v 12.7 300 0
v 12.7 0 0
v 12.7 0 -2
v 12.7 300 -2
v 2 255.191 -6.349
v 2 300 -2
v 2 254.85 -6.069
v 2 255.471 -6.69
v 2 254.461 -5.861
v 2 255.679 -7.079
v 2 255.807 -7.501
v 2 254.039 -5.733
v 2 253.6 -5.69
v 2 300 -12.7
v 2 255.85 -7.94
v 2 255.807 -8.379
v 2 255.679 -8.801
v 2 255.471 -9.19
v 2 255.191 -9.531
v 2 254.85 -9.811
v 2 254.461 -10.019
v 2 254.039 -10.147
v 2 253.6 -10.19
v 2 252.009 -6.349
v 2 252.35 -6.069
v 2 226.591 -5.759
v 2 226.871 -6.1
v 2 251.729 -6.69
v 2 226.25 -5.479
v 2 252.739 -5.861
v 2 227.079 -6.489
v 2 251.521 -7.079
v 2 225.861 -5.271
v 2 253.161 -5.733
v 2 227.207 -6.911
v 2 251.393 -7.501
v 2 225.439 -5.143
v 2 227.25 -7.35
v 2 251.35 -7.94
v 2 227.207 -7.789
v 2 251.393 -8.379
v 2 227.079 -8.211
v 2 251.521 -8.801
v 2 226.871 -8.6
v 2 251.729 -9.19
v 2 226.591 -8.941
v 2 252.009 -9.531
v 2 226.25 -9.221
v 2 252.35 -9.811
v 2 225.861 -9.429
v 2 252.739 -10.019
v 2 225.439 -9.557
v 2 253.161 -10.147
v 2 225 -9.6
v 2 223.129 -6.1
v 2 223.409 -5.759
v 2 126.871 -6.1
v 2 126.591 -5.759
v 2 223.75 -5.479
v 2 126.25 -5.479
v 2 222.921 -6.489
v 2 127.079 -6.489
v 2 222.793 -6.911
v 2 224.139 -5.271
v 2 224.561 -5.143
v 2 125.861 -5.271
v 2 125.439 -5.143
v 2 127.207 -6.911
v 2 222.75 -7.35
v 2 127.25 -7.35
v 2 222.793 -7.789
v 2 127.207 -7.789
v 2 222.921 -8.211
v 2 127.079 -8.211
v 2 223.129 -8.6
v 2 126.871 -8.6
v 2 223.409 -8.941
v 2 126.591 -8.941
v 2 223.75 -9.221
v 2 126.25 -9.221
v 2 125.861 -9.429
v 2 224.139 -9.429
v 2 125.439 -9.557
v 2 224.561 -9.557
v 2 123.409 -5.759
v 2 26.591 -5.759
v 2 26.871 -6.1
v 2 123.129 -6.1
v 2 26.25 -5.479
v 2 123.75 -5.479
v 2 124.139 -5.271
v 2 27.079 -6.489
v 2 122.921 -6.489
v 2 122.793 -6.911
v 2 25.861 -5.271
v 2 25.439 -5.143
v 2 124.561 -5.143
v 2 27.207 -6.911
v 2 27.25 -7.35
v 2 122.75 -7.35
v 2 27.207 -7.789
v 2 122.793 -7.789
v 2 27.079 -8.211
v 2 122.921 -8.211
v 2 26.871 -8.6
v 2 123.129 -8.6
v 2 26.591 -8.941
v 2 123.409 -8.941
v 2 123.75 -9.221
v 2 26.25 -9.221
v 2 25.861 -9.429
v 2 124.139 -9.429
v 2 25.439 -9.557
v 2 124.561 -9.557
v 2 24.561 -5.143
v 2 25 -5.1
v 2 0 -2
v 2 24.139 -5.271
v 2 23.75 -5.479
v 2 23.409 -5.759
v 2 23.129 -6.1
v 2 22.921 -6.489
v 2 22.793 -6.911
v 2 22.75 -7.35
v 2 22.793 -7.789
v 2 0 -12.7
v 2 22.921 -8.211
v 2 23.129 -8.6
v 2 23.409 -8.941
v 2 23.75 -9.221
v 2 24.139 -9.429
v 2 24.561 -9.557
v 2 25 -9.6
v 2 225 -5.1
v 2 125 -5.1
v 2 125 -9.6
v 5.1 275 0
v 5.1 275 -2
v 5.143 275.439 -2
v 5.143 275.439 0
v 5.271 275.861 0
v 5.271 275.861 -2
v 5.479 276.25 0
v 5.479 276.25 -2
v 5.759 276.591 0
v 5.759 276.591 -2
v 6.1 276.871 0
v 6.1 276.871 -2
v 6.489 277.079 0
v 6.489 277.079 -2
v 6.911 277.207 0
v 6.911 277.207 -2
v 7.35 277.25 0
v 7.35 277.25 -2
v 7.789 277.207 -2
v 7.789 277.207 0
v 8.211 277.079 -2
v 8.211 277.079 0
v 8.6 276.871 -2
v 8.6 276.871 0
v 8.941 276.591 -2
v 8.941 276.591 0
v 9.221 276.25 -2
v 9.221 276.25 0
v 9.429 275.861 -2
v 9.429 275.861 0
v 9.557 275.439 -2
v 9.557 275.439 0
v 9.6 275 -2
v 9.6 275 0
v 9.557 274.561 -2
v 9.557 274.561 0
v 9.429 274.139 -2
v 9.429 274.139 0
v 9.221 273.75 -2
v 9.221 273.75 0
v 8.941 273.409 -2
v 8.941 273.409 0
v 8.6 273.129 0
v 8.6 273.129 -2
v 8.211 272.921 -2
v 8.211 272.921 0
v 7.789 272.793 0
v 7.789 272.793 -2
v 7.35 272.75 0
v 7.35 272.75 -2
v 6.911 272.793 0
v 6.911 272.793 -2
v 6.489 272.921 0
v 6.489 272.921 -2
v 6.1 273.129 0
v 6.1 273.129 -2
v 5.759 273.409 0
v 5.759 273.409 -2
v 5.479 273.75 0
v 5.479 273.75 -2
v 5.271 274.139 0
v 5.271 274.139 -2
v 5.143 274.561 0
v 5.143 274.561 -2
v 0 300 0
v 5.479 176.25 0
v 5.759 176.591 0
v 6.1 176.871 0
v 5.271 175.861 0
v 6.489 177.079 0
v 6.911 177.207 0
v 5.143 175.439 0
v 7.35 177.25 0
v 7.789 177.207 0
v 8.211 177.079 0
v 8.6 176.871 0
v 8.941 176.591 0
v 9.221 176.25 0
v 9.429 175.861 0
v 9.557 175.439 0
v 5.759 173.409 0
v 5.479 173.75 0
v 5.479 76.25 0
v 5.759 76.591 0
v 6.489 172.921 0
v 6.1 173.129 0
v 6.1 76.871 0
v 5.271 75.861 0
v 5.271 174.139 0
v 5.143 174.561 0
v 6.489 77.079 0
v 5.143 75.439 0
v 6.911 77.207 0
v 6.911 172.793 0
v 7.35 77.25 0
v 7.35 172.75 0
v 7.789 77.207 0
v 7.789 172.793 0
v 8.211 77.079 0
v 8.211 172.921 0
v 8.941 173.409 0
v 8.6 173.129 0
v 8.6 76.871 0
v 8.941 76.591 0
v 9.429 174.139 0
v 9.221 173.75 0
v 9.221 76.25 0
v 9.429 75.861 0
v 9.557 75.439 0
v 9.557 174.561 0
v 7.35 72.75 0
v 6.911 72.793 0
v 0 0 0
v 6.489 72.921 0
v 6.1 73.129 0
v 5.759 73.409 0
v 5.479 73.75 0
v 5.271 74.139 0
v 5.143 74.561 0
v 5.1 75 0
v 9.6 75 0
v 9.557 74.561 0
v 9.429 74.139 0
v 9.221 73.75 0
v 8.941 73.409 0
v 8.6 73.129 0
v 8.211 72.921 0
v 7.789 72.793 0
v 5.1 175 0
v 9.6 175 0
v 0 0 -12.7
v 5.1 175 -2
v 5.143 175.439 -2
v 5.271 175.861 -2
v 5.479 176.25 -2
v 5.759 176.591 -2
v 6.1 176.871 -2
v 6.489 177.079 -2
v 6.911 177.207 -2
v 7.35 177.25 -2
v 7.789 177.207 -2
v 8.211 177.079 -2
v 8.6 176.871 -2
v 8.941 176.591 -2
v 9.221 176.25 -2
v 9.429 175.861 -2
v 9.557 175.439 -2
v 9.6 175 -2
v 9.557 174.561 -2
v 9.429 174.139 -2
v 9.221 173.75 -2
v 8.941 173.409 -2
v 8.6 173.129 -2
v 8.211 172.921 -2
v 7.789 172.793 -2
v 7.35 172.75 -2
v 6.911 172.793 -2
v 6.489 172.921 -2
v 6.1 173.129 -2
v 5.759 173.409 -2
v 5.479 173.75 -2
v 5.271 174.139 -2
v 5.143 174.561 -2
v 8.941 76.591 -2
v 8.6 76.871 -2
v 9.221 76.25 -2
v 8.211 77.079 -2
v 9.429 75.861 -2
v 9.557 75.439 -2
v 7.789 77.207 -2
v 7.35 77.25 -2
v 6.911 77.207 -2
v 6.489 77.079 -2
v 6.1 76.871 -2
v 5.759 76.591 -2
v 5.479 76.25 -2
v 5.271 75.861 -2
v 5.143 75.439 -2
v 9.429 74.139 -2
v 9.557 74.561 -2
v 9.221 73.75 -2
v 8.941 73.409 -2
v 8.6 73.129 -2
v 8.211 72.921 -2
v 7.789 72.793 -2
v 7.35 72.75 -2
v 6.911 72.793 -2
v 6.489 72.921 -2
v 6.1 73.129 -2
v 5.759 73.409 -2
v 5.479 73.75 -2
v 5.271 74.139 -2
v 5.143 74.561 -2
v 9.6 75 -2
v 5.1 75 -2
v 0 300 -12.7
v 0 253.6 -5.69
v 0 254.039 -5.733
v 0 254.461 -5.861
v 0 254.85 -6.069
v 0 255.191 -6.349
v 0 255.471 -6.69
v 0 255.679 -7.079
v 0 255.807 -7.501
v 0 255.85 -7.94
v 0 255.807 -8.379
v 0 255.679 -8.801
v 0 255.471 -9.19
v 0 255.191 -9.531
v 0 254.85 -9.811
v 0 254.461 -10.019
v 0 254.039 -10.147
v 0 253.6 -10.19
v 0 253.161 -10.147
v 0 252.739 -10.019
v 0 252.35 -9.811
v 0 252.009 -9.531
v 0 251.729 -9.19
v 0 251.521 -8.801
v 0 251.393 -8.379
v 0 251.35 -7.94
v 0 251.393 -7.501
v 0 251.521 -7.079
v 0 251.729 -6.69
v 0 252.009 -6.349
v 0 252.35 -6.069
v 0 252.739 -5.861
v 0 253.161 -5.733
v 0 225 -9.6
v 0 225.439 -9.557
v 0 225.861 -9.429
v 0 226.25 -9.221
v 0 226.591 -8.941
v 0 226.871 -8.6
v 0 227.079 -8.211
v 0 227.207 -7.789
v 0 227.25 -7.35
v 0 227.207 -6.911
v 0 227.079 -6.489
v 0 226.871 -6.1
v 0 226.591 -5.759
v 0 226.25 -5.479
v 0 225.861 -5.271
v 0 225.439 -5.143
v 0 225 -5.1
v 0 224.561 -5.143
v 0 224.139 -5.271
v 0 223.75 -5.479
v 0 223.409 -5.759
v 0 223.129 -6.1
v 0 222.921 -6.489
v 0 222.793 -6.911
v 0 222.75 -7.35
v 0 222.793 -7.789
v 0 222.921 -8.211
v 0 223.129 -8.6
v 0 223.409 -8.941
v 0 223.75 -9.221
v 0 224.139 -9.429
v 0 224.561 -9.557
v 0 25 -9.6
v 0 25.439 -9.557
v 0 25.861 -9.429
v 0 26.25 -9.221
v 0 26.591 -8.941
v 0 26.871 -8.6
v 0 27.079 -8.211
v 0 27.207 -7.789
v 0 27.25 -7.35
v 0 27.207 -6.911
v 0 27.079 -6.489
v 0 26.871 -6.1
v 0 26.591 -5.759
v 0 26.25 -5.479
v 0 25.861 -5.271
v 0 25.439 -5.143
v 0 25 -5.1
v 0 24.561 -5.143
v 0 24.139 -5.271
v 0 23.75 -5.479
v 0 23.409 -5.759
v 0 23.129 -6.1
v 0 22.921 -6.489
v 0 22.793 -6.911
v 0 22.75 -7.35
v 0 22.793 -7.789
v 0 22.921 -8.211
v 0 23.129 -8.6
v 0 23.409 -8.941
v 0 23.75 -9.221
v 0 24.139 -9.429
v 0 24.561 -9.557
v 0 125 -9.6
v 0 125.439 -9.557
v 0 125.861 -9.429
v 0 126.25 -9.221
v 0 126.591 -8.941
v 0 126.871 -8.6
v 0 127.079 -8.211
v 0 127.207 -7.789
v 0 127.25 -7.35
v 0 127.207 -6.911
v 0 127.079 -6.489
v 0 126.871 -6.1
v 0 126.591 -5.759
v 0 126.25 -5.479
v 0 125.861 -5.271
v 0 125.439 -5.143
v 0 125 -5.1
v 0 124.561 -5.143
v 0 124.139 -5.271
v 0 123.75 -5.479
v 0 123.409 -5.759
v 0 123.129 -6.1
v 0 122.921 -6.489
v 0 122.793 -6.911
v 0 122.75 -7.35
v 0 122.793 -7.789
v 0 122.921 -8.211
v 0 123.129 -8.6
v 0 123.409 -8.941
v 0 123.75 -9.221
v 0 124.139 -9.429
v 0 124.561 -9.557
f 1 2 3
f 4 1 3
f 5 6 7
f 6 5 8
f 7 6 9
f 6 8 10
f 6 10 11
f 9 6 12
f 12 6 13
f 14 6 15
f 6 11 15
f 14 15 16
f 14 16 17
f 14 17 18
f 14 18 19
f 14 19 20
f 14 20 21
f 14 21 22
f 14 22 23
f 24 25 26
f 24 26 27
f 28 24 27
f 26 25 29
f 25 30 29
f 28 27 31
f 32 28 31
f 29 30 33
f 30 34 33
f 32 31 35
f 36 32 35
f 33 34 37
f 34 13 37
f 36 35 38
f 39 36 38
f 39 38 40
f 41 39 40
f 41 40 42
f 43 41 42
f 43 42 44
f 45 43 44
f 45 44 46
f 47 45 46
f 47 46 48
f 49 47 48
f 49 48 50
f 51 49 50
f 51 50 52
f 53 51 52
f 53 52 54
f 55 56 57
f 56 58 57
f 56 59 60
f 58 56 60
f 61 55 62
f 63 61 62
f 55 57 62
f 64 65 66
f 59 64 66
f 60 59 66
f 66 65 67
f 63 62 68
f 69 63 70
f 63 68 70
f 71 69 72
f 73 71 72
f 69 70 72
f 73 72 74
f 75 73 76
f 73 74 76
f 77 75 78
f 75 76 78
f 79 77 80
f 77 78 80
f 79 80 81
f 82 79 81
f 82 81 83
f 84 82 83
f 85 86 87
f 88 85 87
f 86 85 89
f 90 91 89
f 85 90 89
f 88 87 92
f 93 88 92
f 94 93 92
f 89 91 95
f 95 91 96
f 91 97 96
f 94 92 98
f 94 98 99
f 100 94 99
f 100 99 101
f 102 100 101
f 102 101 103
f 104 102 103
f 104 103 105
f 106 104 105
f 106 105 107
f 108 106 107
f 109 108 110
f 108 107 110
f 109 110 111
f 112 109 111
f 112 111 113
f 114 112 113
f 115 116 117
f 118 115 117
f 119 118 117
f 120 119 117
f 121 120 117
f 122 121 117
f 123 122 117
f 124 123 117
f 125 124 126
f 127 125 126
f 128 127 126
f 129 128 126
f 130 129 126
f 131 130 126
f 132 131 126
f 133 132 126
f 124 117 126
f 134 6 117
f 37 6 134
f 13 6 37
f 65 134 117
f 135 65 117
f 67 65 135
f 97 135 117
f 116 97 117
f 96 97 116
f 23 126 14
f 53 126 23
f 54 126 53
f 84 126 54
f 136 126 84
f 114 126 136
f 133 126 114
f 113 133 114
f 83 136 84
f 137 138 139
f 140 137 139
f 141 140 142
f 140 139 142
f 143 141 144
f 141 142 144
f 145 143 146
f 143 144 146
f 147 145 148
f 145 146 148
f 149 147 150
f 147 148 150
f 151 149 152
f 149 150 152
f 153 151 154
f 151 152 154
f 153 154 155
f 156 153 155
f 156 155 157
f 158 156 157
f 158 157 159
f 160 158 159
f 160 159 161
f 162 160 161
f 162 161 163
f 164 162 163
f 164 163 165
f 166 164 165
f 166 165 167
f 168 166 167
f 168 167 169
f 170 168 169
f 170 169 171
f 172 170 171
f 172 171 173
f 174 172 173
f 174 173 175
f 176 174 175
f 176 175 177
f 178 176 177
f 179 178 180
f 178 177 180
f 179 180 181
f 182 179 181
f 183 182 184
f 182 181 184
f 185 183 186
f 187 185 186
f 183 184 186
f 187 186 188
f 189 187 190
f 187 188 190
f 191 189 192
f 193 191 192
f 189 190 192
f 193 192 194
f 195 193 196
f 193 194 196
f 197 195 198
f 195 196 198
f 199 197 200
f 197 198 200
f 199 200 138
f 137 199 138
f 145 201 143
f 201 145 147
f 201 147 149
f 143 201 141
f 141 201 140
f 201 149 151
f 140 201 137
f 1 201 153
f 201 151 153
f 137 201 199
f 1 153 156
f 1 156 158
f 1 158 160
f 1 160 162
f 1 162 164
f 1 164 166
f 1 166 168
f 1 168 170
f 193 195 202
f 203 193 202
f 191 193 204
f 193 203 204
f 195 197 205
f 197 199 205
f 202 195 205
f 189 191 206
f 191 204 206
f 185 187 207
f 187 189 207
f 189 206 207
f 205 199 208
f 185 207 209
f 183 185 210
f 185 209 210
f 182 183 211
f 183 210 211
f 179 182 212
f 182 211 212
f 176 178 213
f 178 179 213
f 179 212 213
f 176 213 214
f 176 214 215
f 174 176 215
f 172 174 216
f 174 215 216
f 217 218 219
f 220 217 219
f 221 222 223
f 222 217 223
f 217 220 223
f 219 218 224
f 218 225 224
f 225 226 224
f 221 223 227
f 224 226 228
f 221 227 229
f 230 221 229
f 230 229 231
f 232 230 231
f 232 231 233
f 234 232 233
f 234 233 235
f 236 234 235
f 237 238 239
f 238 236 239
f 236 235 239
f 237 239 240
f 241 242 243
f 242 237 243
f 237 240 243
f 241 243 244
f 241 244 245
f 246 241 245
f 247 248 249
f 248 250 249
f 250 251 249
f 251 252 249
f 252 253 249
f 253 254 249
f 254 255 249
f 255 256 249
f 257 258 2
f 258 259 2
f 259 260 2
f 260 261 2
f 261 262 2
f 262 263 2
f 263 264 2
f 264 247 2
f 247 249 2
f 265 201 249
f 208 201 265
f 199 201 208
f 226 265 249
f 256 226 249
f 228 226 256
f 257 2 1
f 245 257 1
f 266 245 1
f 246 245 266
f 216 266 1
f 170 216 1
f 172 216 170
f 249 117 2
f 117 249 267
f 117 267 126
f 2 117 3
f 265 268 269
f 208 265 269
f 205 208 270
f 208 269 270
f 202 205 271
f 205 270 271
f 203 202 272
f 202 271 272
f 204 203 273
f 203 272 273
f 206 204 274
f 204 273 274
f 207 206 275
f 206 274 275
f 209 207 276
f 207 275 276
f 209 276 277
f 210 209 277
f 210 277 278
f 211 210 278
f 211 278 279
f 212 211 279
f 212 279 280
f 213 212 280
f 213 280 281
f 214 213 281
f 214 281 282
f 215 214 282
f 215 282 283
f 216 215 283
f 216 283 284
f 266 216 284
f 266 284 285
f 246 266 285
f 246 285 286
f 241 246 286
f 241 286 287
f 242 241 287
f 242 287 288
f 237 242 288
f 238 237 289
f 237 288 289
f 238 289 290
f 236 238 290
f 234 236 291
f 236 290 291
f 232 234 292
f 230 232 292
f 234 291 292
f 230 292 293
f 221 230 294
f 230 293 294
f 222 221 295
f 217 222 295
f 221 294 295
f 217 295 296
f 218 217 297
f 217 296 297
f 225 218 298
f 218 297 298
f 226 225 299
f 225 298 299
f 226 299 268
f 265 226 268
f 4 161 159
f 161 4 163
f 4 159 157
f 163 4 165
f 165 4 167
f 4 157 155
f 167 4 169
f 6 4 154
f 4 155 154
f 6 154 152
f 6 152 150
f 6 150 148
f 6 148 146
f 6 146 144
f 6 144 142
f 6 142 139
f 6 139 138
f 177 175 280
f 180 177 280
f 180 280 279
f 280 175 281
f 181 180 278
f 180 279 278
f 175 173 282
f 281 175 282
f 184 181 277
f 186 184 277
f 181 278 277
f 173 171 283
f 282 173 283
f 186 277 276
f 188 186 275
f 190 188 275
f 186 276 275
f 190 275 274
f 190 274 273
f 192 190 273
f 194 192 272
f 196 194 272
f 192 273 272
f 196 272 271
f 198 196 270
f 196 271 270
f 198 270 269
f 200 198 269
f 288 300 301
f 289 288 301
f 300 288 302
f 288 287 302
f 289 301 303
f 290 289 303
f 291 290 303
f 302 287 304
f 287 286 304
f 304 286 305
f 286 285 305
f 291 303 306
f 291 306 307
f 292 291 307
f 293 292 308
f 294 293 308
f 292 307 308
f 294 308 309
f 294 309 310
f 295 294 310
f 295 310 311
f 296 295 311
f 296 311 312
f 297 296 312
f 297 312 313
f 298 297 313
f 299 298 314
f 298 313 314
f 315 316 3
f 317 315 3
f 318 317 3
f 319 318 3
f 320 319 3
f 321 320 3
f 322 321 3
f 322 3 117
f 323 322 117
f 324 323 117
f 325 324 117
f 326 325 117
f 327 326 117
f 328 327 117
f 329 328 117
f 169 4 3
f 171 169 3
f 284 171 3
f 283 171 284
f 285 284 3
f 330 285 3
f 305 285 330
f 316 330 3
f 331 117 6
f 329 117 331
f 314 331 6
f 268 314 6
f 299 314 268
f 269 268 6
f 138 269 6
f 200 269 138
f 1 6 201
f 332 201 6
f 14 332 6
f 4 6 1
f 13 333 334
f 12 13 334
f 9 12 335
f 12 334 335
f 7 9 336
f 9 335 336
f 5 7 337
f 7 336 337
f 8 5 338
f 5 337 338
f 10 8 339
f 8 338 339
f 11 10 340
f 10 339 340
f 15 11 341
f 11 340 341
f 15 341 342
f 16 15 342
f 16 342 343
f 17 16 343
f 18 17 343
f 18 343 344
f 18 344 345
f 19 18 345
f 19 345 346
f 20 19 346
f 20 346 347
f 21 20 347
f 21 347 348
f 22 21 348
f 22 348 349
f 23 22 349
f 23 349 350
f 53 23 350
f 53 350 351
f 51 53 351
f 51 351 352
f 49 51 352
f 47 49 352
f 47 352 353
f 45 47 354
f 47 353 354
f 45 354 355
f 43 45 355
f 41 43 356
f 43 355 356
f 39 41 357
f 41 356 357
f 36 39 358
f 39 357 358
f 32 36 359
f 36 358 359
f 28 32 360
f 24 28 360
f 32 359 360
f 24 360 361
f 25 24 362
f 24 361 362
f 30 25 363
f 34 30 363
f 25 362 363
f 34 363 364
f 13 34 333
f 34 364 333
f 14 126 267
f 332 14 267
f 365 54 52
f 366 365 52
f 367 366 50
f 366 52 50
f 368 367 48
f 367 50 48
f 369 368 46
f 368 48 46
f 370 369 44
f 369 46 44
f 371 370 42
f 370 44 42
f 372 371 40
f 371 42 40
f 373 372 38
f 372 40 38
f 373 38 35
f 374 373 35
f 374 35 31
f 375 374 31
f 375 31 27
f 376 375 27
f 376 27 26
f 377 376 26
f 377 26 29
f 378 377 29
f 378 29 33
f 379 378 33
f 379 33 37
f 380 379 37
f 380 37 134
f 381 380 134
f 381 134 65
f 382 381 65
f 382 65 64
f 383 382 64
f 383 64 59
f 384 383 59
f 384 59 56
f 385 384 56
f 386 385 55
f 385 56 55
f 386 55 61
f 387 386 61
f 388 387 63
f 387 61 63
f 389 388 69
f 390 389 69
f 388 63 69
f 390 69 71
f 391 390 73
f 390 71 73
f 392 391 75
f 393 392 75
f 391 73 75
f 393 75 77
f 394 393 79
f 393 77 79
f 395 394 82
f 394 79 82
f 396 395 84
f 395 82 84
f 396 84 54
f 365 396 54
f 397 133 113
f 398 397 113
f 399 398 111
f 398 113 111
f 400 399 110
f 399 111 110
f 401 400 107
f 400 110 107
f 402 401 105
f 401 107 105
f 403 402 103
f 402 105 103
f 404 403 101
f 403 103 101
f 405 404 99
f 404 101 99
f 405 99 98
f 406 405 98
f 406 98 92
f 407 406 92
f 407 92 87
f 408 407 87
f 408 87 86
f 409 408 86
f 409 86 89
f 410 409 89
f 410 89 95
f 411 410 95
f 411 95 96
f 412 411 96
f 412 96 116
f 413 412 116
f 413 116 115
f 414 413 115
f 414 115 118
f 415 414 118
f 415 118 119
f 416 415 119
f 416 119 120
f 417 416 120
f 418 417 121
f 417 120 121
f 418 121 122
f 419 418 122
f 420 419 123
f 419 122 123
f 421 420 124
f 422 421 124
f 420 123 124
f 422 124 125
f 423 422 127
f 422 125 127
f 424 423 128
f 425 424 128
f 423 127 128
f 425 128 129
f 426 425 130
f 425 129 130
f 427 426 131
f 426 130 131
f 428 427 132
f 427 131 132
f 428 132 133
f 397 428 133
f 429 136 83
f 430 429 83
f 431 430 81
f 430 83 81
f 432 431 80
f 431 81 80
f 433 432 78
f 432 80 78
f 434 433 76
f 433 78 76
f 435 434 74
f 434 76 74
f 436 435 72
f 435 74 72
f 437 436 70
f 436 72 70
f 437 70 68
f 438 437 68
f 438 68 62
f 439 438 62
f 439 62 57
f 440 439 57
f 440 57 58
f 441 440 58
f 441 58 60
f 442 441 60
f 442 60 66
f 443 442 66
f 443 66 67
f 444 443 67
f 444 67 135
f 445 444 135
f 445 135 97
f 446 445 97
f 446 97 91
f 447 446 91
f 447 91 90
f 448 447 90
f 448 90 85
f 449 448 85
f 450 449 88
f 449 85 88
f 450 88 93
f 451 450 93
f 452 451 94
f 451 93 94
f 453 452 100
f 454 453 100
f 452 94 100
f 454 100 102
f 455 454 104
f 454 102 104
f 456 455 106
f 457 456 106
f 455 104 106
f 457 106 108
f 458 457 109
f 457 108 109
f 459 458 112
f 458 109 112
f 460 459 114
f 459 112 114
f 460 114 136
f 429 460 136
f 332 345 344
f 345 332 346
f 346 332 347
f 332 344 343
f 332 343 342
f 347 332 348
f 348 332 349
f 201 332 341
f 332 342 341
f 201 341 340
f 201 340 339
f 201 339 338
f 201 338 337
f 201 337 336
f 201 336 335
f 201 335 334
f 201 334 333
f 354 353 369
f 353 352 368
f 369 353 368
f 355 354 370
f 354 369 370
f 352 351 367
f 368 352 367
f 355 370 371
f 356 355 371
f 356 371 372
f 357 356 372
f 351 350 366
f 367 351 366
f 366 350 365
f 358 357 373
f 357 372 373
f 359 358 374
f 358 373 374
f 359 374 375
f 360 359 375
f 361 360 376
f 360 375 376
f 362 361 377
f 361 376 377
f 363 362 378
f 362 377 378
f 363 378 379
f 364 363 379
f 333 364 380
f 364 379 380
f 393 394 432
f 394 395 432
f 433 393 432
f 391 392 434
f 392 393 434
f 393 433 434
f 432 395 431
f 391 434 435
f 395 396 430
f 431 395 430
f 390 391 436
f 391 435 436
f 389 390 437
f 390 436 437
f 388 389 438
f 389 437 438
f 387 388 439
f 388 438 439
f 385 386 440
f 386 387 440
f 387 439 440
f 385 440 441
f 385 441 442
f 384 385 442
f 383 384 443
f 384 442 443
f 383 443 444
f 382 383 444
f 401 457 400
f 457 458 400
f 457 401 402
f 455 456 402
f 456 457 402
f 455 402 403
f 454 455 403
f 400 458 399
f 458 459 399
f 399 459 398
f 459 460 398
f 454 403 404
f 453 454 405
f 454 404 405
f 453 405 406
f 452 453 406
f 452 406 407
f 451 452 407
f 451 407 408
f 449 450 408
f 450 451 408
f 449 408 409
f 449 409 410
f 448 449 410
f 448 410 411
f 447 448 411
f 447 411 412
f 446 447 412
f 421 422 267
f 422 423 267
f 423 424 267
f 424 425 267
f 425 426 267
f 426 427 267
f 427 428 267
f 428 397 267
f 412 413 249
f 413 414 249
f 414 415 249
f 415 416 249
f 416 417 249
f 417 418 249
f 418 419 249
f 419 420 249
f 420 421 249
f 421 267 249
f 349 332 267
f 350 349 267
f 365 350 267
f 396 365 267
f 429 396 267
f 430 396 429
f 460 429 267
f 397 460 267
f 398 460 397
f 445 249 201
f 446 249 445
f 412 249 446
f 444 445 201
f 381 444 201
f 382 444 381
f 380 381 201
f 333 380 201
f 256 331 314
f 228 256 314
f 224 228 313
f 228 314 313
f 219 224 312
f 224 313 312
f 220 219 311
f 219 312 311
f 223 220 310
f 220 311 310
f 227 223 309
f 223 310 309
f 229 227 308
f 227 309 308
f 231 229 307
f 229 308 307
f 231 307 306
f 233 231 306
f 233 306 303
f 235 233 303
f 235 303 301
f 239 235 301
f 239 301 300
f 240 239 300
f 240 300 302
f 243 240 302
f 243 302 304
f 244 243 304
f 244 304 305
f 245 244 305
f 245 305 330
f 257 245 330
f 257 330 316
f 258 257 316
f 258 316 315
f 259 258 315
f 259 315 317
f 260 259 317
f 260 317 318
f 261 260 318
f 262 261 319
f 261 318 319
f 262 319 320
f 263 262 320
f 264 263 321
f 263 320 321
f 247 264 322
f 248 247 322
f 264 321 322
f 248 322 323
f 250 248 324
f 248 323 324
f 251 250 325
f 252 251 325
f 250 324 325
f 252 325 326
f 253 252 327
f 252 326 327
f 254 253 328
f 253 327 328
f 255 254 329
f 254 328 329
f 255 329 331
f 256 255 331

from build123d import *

# Parameters (mm, degrees)
BOSS_EXTRUDE1_DEPTH = 300
SKETCH2_R           = 2.25
CUT_EXTRUDE1_DEPTH  = 10
SKETCH3_R           = 2.25
CUT_EXTRUDE2_DEPTH  = 10
SKETCH5_R           = 2.25
CUT_EXTRUDE3_DEPTH  = 10


with BuildPart() as part:
    # Sketch1 → Boss-Extrude1 (new body)
    with BuildSketch(Plane(origin=(0, 0, 0), x_dir=(1, 0, 0), z_dir=(0, 1, 0))):
        Polygon((0, 0), (12.7, 0), (12.7, 2), (2, 2), (2, 12.7), (0, 12.7), align=None)
    extrude(amount=BOSS_EXTRUDE1_DEPTH)

    # Sketch2 → Cut-Extrude1 (cut)
    with BuildSketch(Plane(origin=(0, 0, -2), x_dir=(-1, 0, 0), z_dir=(0, 0, -1))):
        with Locations((-7.35, 275)):
            Circle(SKETCH2_R)
        with Locations((-7.35, 175)):
            Circle(SKETCH2_R)
        with Locations((-7.35, 75)):
            Circle(SKETCH2_R)
    extrude(amount=-CUT_EXTRUDE1_DEPTH, mode=Mode.SUBTRACT)

    # Sketch3 → Cut-Extrude2 (cut)
    with BuildSketch(Plane(origin=(2, 0, 0), x_dir=(0, 0, -1), z_dir=(1, 0, 0))):
        with Locations((7.35, 225)):
            Circle(SKETCH3_R)
        with Locations((7.35, 125)):
            Circle(SKETCH3_R)
        with Locations((7.35, 25)):
            Circle(SKETCH3_R)
    extrude(amount=-CUT_EXTRUDE2_DEPTH, mode=Mode.SUBTRACT)

    # Sketch5 → Cut-Extrude3 (cut)
    with BuildSketch(Plane.ZY):
        with Locations((-7.94, 253.6)):
            Circle(SKETCH5_R)
    extrude(amount=-CUT_EXTRUDE3_DEPTH, mode=Mode.SUBTRACT)


solid = part.part
